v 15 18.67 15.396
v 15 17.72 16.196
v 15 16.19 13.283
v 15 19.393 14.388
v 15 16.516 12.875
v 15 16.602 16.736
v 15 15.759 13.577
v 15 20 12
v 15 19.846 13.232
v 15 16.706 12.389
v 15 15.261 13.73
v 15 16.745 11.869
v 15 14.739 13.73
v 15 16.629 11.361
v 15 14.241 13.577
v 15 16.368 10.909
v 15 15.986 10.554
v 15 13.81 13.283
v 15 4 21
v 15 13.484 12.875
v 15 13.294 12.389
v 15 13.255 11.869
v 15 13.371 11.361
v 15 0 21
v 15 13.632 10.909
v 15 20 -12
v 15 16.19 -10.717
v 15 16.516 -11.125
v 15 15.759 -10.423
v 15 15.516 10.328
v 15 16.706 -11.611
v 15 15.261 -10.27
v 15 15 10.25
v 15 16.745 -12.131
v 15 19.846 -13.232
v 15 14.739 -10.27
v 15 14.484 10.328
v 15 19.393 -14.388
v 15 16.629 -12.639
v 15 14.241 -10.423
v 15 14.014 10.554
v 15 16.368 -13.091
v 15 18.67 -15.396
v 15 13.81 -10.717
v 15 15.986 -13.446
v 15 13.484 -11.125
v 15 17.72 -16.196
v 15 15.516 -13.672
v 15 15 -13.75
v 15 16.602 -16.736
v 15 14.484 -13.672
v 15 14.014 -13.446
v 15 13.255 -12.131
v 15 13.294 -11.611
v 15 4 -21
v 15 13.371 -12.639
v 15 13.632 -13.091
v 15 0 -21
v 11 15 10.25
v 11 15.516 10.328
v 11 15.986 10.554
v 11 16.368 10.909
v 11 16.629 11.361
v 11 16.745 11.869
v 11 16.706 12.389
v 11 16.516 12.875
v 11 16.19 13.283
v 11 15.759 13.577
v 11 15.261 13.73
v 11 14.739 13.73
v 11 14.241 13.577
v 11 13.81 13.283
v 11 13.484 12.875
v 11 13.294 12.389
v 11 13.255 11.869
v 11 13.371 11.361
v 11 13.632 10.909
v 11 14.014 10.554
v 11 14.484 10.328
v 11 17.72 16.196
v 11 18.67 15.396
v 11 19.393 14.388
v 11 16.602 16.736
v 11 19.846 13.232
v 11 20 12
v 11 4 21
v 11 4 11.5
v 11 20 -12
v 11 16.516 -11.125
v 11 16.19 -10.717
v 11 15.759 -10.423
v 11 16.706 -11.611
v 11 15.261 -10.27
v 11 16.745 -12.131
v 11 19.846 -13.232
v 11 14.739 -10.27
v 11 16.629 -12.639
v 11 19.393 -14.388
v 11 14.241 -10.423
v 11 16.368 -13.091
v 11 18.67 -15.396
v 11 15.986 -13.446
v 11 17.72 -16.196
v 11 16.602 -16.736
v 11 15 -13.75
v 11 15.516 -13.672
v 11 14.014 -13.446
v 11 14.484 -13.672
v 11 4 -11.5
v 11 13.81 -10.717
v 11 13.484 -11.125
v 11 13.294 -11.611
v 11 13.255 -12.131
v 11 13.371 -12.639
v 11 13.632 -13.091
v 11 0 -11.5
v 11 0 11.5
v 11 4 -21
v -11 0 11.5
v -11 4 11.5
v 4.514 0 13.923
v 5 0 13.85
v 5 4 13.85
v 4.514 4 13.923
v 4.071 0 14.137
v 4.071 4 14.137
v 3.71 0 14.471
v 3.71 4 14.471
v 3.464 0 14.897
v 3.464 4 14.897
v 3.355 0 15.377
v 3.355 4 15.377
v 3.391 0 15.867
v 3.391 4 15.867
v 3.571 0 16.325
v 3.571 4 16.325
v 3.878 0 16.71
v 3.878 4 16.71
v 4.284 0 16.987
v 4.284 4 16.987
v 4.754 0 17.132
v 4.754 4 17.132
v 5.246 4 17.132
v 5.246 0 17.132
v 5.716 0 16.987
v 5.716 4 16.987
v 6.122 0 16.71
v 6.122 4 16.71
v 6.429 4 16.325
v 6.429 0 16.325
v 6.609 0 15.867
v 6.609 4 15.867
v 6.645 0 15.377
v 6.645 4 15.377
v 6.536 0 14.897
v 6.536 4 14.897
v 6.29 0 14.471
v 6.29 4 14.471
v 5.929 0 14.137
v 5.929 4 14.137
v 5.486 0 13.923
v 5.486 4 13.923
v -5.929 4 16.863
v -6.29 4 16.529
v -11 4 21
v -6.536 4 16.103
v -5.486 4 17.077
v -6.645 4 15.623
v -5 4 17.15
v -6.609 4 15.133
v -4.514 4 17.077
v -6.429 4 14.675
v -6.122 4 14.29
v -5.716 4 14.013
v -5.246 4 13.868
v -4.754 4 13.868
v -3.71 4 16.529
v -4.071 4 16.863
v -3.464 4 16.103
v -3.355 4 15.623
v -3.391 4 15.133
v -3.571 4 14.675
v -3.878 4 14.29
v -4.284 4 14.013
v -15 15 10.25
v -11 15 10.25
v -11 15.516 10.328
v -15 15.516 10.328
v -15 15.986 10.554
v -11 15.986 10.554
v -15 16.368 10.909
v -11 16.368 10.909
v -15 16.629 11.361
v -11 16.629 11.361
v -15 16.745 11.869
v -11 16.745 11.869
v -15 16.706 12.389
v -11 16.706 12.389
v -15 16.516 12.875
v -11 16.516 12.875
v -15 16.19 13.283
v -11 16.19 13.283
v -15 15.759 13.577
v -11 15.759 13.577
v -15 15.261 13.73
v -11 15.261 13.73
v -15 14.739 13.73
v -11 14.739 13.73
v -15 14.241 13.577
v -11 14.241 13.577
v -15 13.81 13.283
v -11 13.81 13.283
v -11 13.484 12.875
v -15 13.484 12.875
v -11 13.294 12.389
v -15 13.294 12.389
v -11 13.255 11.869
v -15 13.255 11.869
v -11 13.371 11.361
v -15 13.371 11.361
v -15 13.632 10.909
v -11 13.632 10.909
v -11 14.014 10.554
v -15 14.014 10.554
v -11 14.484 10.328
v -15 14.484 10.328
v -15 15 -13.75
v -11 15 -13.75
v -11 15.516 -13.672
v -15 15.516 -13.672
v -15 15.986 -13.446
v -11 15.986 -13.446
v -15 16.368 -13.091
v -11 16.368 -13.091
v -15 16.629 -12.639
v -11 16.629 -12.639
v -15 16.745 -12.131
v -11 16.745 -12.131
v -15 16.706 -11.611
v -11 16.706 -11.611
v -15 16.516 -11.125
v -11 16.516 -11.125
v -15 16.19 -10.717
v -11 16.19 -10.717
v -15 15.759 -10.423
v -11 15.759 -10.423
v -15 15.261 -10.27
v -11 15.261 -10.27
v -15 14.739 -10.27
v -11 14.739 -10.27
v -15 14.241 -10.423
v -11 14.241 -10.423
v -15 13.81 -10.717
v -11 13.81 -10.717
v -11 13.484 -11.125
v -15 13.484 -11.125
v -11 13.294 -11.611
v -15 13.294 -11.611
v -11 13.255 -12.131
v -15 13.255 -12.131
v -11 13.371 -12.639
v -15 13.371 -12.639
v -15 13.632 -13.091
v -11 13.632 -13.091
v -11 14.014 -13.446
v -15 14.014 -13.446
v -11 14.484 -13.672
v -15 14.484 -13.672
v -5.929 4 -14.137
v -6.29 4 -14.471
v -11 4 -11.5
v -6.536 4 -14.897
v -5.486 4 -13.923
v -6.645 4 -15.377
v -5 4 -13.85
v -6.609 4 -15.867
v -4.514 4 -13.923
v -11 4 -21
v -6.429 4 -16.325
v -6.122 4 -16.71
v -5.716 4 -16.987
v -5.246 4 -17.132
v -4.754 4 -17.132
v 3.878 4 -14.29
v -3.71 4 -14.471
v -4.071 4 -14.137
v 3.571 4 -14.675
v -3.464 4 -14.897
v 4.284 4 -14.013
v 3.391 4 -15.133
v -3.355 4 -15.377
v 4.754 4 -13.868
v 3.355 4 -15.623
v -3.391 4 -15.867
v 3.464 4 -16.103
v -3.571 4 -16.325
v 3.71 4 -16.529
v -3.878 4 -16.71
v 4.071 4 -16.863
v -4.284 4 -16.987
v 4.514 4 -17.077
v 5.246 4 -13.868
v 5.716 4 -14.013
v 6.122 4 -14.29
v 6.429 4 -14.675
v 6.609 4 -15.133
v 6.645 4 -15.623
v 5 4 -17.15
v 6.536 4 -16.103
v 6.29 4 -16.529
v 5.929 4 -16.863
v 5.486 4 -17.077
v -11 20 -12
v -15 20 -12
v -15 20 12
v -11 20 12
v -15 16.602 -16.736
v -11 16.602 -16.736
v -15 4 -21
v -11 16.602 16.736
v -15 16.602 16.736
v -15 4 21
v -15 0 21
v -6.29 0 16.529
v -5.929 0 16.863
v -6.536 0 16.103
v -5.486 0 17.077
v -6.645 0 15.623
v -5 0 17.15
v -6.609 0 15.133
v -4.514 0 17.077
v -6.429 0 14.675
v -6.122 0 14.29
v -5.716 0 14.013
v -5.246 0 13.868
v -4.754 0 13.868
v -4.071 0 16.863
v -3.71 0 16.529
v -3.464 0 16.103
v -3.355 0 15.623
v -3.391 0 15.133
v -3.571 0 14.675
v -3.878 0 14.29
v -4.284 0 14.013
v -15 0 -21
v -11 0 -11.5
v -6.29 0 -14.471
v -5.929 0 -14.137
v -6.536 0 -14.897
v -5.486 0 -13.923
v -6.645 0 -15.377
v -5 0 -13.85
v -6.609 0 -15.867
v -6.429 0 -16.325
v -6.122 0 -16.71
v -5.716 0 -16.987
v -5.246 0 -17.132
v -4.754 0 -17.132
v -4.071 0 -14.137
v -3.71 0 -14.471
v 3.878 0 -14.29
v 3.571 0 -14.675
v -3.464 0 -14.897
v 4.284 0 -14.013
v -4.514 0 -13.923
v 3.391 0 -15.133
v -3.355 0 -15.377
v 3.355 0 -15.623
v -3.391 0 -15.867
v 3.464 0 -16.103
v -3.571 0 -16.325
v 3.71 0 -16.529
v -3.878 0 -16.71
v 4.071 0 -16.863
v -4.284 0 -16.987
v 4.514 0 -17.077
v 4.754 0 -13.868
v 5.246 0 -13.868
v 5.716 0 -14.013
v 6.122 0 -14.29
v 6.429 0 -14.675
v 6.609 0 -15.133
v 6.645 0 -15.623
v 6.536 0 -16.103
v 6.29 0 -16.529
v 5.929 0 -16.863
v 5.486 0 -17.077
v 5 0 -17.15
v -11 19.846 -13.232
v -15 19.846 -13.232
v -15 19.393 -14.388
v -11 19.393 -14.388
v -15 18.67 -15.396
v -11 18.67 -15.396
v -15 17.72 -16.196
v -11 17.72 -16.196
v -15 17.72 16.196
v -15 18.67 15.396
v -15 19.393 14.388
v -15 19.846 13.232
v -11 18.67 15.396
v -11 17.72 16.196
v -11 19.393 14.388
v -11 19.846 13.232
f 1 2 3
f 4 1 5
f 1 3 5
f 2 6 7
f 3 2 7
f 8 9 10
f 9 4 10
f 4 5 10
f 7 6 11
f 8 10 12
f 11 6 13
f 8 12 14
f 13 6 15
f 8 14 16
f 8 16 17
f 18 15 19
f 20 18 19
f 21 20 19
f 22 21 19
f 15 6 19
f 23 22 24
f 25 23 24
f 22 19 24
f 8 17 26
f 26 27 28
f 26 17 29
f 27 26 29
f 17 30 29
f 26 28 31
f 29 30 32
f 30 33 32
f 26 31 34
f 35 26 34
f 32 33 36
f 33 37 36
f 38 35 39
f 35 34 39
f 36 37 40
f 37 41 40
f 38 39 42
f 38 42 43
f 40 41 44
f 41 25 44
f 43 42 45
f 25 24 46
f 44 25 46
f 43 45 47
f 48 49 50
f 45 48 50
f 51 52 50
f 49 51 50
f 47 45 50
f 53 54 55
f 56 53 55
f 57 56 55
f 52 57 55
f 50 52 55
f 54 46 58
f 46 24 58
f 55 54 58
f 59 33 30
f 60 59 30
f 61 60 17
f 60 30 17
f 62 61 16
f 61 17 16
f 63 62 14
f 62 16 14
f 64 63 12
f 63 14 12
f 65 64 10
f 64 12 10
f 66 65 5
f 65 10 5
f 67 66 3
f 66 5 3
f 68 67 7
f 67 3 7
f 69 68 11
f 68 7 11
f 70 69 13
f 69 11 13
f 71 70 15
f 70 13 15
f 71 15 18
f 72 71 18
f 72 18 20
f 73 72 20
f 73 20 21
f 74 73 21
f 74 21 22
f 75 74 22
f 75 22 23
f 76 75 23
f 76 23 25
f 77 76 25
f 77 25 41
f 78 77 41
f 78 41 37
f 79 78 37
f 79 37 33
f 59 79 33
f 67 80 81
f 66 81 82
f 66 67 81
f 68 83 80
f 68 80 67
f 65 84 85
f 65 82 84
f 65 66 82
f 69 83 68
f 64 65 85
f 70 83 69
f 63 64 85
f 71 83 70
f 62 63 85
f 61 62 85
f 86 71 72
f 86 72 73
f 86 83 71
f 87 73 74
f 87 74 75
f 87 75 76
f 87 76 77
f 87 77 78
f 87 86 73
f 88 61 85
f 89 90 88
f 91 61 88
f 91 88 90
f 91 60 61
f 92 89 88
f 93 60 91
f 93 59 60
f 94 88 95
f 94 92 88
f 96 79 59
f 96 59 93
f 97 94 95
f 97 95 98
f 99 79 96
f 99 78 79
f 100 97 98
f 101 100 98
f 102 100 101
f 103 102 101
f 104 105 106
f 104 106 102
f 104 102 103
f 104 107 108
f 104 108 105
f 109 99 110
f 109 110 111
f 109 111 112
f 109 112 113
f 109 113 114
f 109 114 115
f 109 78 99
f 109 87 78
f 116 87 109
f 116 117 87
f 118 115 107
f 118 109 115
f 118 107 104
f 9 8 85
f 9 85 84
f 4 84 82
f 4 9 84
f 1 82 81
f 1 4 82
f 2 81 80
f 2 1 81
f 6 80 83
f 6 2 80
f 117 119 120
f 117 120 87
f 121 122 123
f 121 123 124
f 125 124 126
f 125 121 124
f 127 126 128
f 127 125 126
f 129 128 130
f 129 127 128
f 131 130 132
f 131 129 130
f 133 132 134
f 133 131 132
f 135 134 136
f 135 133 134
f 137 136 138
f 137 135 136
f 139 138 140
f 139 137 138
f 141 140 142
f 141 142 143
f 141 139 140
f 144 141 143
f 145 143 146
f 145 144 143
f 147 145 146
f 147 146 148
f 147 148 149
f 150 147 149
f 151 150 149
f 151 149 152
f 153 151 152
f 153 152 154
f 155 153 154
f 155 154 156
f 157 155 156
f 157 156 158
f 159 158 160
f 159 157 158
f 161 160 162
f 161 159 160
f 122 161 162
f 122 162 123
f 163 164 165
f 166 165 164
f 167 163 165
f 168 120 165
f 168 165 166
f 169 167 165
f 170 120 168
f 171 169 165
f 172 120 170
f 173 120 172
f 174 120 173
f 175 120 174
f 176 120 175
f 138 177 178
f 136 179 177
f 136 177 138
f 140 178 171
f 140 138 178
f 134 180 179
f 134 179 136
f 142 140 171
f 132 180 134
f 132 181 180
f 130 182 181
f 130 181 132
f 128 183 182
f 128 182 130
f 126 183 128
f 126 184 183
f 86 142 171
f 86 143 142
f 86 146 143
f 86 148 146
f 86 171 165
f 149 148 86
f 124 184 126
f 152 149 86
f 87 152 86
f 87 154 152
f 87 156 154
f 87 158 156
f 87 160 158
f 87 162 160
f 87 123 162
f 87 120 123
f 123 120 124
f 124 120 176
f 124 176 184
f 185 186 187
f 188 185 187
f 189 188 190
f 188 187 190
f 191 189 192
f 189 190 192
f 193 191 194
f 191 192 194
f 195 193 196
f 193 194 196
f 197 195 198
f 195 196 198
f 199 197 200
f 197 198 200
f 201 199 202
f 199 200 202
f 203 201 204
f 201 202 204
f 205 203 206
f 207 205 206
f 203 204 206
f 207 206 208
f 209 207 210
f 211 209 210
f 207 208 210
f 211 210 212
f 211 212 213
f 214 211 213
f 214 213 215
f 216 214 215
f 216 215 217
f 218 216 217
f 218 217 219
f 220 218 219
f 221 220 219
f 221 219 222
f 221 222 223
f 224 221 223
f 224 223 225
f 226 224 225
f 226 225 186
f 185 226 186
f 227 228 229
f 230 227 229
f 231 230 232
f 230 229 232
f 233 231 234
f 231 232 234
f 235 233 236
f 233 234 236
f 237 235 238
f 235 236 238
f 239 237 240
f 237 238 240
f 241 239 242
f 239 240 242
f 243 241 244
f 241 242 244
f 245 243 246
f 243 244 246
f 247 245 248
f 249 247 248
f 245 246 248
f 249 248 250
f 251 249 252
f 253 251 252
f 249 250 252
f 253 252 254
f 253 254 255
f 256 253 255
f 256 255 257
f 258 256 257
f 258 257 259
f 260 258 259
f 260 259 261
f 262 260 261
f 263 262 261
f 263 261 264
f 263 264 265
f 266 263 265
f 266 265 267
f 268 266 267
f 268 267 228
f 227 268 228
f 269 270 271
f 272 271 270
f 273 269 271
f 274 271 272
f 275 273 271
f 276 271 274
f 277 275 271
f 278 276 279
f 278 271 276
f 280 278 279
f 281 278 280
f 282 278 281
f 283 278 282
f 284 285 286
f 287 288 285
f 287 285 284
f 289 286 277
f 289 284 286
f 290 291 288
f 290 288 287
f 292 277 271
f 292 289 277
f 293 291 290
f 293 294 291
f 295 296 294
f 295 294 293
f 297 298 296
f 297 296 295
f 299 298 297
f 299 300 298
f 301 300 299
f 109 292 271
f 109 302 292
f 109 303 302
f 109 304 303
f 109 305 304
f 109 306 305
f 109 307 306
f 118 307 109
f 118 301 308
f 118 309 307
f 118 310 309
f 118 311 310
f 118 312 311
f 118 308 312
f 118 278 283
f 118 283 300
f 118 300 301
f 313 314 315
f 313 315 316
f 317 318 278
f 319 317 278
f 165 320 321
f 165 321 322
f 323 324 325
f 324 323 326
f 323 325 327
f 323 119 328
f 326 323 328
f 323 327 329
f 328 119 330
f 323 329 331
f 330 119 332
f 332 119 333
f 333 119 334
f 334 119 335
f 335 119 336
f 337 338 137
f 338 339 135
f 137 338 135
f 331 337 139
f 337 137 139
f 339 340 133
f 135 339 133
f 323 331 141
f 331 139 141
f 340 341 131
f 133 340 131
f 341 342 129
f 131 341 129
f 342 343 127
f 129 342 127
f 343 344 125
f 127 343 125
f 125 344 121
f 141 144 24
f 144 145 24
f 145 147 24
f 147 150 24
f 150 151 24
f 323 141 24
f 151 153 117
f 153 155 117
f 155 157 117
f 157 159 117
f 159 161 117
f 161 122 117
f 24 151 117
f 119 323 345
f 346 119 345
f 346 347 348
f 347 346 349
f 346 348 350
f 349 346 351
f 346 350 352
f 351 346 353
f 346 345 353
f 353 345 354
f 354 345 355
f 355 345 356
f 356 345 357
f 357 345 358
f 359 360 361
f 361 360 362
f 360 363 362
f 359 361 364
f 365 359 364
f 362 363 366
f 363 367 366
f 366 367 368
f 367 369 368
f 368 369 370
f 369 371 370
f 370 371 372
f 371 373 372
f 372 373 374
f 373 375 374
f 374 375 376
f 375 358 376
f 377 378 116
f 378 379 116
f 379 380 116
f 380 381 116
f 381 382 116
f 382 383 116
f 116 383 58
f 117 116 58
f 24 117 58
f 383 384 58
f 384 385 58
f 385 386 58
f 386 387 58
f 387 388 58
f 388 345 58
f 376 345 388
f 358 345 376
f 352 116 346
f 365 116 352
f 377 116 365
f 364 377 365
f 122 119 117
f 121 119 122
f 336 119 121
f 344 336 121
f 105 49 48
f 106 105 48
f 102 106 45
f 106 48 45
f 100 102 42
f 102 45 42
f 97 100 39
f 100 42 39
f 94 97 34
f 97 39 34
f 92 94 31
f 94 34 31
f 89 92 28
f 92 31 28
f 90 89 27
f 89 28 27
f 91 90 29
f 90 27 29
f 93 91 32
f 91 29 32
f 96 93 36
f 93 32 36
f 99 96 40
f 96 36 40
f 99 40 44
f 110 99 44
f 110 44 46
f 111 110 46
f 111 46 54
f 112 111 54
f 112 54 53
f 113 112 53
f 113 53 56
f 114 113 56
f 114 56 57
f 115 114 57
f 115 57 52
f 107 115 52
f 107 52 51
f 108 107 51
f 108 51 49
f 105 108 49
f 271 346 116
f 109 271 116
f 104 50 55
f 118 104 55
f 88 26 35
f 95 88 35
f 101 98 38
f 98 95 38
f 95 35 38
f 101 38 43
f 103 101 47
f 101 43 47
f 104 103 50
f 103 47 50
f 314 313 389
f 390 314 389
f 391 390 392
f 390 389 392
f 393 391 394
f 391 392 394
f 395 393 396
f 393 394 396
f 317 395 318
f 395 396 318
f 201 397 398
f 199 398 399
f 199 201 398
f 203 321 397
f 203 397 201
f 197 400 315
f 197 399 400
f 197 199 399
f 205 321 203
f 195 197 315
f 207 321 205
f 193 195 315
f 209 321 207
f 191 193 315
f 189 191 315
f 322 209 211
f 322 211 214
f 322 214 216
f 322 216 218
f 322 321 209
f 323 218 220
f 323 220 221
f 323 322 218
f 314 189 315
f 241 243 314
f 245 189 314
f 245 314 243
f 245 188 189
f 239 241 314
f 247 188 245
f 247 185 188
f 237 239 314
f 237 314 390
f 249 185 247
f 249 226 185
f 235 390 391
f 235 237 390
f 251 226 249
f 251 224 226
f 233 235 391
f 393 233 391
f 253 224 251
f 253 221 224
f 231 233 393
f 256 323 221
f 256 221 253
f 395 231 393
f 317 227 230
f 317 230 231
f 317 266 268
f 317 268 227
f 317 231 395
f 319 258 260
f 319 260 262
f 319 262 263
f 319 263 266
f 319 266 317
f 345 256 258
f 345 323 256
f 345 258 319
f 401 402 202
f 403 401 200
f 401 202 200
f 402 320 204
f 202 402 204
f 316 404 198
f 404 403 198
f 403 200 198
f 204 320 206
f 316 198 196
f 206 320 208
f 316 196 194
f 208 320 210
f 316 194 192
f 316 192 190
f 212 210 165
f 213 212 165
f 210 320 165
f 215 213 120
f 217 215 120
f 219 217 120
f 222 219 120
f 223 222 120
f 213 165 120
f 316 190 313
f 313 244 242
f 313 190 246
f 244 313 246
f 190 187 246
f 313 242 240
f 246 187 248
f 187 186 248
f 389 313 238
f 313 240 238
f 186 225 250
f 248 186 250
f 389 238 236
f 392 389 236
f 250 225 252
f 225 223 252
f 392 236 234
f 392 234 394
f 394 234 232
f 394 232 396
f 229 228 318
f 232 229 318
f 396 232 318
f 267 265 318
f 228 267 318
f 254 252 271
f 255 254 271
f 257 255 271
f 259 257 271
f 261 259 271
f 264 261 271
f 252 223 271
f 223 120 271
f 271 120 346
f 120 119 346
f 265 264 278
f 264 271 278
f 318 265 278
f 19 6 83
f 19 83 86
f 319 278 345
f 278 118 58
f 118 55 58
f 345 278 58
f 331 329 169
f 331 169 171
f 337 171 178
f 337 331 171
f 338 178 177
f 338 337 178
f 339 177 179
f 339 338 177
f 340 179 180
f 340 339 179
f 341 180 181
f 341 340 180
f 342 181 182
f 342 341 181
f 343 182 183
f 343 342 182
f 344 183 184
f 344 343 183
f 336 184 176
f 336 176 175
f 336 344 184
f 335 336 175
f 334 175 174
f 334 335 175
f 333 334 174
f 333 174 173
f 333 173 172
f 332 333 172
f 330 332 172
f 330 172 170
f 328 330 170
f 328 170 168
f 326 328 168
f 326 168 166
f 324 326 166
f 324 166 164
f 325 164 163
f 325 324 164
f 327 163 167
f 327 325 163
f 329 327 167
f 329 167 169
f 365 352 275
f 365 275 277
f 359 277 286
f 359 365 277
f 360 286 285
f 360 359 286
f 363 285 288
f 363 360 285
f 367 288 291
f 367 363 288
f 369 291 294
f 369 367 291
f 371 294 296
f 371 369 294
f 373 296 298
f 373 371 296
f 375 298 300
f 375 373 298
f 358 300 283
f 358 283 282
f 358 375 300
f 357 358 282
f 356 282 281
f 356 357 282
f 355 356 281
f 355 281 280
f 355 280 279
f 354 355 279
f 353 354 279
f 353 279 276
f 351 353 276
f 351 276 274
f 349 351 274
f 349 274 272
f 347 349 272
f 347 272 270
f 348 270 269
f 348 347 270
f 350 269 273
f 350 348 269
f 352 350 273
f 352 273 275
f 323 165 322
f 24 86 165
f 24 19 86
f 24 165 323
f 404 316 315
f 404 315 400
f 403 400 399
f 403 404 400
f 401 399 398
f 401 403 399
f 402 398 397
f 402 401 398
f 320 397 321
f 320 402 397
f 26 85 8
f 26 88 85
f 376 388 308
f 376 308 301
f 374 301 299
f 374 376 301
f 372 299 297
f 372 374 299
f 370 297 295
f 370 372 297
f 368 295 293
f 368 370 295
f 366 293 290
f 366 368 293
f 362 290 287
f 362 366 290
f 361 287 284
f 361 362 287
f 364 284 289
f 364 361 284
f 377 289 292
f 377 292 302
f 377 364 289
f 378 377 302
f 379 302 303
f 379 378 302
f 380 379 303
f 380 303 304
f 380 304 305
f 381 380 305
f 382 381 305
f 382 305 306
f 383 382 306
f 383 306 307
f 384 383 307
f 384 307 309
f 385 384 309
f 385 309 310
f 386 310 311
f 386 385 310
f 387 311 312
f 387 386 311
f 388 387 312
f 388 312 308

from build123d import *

# Parameters (mm, degrees)
ESBO_O1_W                  = 30
ESBO_O1_H                  = 50
ESBO_O1_W_2                = 22
ESBO_O1_H_2                = 42
RESSALTO_EXTRUS_O1_DEPTH   = 20
ESBO_O3_R                  = 1.75
CORTE_EXTRUS_O2_DEPTH      = 44.874821937
ESBO_O4_W                  = 22
ESBO_O4_H                  = 9.5
ESBO_O4_R                  = 1.65
RESSALTO_EXTRUS_O2_DEPTH   = 4
CORTE_EXTRUS_O3_DEPTH      = 44.874821937
CORTE_EXTRUS_O3_DEPTH_BACK = 44.874821937


with BuildPart() as part:
    # Esboço1 → Ressalto-extrusão1 (new body)
    with BuildSketch(Plane(origin=(0, 0, 0), x_dir=(1, 0, 0), z_dir=(0, 1, 0))):
        Rectangle(ESBO_O1_W, ESBO_O1_H)
        Rectangle(ESBO_O1_W_2, ESBO_O1_H_2, mode=Mode.SUBTRACT)
    extrude(amount=RESSALTO_EXTRUS_O1_DEPTH)

    # Esboço3 → Corte-extrusão2 (cut, through all)
    with BuildSketch(Plane(origin=(15, 0, 0), x_dir=(0, 0, -1), z_dir=(1, 0, 0))):
        with Locations((-12, 15)):
            Circle(ESBO_O3_R)
        with Locations((12, 15)):
            Circle(ESBO_O3_R)
    extrude(amount=-CORTE_EXTRUS_O2_DEPTH, mode=Mode.SUBTRACT)

    # Esboço4 → Ressalto-extrusão2 (add)
    # profile 1 of 2: a face of its own
    with BuildSketch(Plane(origin=(0, 0, 0), x_dir=(1, 0, 0), z_dir=(0, 1, 0))):
        with Locations((0, 16.25)):
            Rectangle(ESBO_O4_W, ESBO_O4_H)
        with Locations(Location((-5, 15.5, 0), (0, 0, 270))):
            Circle(ESBO_O4_R, mode=Mode.SUBTRACT)
        with Locations(Location((5, 15.5, 0), (0, 0, 90))):
            Circle(ESBO_O4_R, mode=Mode.SUBTRACT)
    # profile 2 of 2: a face of its own
    with BuildSketch(Plane(origin=(0, 0, 0), x_dir=(1, 0, 0), z_dir=(0, 1, 0))):
        with Locations((0, -16.25)):
            Rectangle(ESBO_O4_W, ESBO_O4_H)
        with Locations(Location((5, -15.5, 0), (0, 0, 90))):
            Circle(ESBO_O4_R, mode=Mode.SUBTRACT)
        with Locations(Location((-5, -15.5, 0), (0, 0, 270))):
            Circle(ESBO_O4_R, mode=Mode.SUBTRACT)
    extrude(amount=RESSALTO_EXTRUS_O2_DEPTH)

    # Esboço5 → Corte-extrusão3 (cut, two sides: drawn at the far end of the back side and taken through both)
    with BuildSketch(Plane.ZY.offset(15).offset(-CORTE_EXTRUS_O3_DEPTH_BACK)):
        with BuildLine():
            Line((-16.736274298, 16.602406244), (-21, 4))
            Line((-21, 4), (-21, 0))
            Line((-21, 0), (-25, 0))
            Line((-25, 0), (-25, 4))
            Line((-25, 4), (-25, 20))
            Line((-25, 20), (-12, 20))
            ThreePointArc((-12, 20), (-14.914444096, 19.062759605), (-16.736274298, 16.602406244))
        make_face()
        with BuildLine():
            Line((25, 0), (25, 4))
            Line((25, 4), (25, 20))
            Line((25, 20), (12, 20))
            ThreePointArc((12, 20), (14.914444096, 19.062759605), (16.736274298, 16.602406244))
            Line((16.736274298, 16.602406244), (21, 4))
            Line((21, 4), (21, 0))
            Line((21, 0), (25, 0))
        make_face()
    extrude(amount=CORTE_EXTRUS_O3_DEPTH + CORTE_EXTRUS_O3_DEPTH_BACK, mode=Mode.SUBTRACT)


solid = part.part
